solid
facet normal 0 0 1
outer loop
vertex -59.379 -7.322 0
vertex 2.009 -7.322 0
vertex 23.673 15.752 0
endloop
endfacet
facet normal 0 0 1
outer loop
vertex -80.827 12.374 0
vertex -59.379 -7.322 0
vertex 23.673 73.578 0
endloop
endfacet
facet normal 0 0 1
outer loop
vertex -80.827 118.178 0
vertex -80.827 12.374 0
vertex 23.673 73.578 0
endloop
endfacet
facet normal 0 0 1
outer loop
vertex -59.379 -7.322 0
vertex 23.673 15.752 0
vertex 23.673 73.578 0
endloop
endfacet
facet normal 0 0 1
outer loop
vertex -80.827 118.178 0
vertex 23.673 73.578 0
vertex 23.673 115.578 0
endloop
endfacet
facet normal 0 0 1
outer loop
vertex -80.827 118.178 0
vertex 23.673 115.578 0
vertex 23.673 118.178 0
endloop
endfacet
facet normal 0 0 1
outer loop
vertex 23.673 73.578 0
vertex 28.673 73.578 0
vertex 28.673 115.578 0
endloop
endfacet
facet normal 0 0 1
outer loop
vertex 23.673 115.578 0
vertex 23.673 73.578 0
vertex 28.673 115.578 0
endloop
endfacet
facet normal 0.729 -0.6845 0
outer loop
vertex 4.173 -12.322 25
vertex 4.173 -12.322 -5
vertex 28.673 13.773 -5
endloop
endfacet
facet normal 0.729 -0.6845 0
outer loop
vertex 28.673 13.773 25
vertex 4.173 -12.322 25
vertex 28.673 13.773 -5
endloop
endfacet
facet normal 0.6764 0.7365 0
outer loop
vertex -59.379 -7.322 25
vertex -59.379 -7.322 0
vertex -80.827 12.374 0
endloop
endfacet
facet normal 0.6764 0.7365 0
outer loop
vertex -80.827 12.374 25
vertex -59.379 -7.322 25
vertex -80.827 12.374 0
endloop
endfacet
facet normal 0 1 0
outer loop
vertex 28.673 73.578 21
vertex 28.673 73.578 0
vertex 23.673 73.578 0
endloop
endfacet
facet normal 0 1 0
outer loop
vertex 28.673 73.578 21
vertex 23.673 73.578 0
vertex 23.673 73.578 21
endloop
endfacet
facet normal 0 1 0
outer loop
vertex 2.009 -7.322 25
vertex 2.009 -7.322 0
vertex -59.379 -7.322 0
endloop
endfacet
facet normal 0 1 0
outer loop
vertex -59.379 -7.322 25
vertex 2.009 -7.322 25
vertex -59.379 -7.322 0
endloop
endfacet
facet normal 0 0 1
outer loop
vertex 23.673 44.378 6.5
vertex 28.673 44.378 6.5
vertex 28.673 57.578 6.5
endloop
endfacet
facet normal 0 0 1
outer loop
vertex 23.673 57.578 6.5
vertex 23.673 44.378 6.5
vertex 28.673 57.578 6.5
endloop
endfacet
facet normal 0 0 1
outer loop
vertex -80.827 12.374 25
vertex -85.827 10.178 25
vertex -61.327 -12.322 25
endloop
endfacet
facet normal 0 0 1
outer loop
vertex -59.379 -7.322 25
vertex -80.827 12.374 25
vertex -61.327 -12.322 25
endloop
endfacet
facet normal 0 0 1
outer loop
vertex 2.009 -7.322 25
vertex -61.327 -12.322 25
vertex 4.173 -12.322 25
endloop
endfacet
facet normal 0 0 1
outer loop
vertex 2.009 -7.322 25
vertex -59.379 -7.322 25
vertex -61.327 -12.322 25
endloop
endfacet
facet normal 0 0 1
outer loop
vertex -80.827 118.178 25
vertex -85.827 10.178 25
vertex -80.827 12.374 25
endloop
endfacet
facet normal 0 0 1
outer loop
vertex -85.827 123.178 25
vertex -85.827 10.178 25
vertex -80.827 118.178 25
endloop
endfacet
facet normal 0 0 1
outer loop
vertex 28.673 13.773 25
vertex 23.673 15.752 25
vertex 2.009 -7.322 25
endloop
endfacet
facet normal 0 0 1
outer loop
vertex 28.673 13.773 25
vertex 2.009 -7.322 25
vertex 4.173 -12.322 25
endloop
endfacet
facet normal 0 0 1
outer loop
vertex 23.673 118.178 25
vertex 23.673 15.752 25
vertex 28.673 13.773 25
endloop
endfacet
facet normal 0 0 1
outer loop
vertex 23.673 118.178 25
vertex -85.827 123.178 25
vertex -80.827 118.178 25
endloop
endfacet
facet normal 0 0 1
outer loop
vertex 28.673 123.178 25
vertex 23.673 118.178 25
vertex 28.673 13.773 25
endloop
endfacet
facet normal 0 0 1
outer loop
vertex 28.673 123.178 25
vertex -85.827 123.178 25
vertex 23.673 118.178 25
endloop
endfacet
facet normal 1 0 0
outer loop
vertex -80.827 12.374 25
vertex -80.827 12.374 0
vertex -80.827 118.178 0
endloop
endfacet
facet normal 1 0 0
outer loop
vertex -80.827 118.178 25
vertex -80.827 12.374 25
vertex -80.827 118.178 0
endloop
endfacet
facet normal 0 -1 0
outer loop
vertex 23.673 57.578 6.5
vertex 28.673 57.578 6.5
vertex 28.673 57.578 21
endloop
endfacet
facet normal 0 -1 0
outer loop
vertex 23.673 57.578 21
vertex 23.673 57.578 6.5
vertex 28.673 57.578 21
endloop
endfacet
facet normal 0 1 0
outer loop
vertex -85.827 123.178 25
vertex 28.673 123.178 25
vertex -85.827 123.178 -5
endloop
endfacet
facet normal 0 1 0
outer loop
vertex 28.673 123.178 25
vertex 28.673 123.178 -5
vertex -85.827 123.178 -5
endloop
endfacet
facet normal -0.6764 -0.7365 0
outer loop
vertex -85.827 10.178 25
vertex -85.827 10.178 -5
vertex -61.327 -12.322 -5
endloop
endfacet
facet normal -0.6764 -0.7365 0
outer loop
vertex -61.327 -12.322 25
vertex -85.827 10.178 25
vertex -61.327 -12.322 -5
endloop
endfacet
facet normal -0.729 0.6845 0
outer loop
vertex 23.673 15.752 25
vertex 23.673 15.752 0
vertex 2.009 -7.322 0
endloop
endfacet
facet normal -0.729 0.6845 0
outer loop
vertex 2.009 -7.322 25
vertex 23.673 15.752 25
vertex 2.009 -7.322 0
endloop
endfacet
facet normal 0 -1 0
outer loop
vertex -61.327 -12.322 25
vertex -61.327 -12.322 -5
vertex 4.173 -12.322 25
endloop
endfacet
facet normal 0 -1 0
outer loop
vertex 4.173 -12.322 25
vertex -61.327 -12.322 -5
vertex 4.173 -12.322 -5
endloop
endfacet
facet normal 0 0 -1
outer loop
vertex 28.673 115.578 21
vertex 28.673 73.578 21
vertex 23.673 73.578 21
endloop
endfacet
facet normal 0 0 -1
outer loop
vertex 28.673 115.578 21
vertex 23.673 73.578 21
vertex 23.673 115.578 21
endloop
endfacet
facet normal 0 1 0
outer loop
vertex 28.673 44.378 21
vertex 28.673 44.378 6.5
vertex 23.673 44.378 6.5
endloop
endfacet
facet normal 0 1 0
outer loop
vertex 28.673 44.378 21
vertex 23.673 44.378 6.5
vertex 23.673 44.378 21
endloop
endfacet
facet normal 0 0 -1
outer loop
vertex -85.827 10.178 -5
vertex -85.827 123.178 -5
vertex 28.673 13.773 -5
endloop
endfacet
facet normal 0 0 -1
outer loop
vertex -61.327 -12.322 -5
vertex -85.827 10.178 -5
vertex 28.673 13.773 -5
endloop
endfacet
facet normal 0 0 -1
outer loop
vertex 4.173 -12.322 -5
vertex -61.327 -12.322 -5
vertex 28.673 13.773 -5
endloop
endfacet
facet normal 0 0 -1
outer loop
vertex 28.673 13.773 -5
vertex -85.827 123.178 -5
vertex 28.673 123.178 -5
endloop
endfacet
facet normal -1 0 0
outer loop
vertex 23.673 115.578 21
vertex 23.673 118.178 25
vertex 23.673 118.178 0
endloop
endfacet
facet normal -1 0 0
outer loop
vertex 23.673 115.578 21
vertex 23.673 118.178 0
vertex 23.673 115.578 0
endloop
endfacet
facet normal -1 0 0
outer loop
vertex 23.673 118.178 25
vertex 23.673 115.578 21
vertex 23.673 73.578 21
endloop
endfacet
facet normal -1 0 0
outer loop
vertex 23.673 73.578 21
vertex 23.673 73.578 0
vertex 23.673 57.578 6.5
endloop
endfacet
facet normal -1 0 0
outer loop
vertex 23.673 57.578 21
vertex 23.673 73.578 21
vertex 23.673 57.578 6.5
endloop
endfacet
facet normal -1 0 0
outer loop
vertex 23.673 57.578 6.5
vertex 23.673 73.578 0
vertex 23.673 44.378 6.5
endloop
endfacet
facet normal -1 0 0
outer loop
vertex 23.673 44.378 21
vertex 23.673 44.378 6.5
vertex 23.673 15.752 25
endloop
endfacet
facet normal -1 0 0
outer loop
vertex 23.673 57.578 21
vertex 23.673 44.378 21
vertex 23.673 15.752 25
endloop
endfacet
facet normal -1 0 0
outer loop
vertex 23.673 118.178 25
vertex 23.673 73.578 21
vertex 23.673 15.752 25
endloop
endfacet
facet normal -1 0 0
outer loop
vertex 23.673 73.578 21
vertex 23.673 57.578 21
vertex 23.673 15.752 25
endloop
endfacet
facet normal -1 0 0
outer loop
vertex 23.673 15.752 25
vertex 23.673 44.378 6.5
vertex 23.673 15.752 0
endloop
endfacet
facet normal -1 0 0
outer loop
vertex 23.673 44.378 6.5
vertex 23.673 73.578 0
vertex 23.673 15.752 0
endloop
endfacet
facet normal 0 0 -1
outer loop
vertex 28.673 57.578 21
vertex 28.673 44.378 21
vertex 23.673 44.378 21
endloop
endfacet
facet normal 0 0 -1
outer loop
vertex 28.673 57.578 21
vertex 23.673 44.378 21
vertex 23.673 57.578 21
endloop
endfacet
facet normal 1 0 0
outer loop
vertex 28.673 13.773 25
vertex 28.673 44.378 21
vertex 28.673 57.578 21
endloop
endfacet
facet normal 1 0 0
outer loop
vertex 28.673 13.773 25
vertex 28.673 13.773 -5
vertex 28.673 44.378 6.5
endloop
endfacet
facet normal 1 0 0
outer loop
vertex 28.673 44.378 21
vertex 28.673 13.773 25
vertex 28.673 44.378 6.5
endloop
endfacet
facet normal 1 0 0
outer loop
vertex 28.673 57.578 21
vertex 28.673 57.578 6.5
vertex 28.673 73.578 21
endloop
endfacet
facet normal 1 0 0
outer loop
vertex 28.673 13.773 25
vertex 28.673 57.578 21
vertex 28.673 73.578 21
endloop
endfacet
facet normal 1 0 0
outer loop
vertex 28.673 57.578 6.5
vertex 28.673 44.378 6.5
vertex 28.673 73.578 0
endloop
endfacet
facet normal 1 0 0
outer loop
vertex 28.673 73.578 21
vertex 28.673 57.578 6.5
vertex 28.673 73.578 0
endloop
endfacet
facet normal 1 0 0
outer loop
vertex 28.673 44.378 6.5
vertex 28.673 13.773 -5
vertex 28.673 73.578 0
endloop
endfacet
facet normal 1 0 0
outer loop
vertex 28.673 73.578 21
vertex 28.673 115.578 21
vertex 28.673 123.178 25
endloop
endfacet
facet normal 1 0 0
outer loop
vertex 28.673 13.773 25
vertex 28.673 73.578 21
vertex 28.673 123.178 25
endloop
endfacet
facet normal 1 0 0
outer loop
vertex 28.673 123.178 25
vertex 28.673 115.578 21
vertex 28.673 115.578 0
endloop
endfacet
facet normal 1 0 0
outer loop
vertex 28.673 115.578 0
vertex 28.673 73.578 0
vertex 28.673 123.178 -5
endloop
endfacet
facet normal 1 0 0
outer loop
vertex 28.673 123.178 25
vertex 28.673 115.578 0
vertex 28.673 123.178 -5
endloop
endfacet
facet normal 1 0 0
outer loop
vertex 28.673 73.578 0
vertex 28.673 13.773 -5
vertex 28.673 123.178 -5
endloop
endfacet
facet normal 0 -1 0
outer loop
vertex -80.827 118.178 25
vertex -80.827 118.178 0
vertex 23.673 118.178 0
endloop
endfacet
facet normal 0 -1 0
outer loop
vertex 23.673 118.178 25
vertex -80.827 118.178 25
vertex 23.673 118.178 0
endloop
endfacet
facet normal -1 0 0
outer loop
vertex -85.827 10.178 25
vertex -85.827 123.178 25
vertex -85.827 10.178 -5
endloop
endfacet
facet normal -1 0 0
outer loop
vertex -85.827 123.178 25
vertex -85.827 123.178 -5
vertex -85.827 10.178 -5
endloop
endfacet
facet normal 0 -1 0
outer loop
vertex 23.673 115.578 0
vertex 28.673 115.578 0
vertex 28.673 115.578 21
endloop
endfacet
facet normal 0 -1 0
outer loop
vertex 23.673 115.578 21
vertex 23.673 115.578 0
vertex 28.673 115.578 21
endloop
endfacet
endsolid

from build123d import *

# Parameters (mm, degrees)
F2_DEPTH = 5
F4_DEPTH = 25
F5_W     = 42
F5_H     = 21
F5_W_2   = 13.2
F5_H_2   = 14.5
F6_DEPTH = 5
F7_DEPTH = 5


with BuildPart() as f2:
    # F0 (on Top) → F2 (new body)
    with BuildSketch(Plane.XY):
        Polygon((28.673304, 123.177742), (-85.826696, 123.177742), (-85.826696, 10.177742), (-61.326696, -12.322258), (4.173304, -12.322258), (28.673304, 13.772988), align=None)
    extrude(amount=-F2_DEPTH)

    # F3 (on face) → F4 (join)
    with BuildSketch(Plane.XY):
        Polygon((4.173304, -12.322258), (28.673304, 13.772988), (28.673304, 123.177742), (-85.826696, 123.177742), (-85.826696, 10.177742), (-61.326696, -12.322258), align=None)
        Polygon((-80.826696, 118.177742), (23.673304, 118.177742), (23.673304, 15.75233), (2.009304, -7.322258), (-59.37912, -7.322258), (-80.826696, 12.374496), align=None, mode=Mode.SUBTRACT)
    extrude(amount=F4_DEPTH)

    # F5 (on face) → F6 (cut)
    with BuildSketch(Plane.YZ.offset(28.673304)):
        with Locations((94.577742, 10.5)):
            Rectangle(F5_W, F5_H)
        with Locations((50.977742, 13.75)):
            Rectangle(F5_W_2, F5_H_2)
    extrude(amount=F6_DEPTH, mode=Mode.SUBTRACT)

    # F5 (on face) → F7 (cut, through all)
    with BuildSketch(Plane.YZ.offset(28.673304)):
        with Locations((94.577742, 10.5)):
            Rectangle(F5_W, F5_H)
        with Locations((50.977742, 13.75)):
            Rectangle(F5_W_2, F5_H_2)
    extrude(amount=-F7_DEPTH, mode=Mode.SUBTRACT)


solid = f2.part
